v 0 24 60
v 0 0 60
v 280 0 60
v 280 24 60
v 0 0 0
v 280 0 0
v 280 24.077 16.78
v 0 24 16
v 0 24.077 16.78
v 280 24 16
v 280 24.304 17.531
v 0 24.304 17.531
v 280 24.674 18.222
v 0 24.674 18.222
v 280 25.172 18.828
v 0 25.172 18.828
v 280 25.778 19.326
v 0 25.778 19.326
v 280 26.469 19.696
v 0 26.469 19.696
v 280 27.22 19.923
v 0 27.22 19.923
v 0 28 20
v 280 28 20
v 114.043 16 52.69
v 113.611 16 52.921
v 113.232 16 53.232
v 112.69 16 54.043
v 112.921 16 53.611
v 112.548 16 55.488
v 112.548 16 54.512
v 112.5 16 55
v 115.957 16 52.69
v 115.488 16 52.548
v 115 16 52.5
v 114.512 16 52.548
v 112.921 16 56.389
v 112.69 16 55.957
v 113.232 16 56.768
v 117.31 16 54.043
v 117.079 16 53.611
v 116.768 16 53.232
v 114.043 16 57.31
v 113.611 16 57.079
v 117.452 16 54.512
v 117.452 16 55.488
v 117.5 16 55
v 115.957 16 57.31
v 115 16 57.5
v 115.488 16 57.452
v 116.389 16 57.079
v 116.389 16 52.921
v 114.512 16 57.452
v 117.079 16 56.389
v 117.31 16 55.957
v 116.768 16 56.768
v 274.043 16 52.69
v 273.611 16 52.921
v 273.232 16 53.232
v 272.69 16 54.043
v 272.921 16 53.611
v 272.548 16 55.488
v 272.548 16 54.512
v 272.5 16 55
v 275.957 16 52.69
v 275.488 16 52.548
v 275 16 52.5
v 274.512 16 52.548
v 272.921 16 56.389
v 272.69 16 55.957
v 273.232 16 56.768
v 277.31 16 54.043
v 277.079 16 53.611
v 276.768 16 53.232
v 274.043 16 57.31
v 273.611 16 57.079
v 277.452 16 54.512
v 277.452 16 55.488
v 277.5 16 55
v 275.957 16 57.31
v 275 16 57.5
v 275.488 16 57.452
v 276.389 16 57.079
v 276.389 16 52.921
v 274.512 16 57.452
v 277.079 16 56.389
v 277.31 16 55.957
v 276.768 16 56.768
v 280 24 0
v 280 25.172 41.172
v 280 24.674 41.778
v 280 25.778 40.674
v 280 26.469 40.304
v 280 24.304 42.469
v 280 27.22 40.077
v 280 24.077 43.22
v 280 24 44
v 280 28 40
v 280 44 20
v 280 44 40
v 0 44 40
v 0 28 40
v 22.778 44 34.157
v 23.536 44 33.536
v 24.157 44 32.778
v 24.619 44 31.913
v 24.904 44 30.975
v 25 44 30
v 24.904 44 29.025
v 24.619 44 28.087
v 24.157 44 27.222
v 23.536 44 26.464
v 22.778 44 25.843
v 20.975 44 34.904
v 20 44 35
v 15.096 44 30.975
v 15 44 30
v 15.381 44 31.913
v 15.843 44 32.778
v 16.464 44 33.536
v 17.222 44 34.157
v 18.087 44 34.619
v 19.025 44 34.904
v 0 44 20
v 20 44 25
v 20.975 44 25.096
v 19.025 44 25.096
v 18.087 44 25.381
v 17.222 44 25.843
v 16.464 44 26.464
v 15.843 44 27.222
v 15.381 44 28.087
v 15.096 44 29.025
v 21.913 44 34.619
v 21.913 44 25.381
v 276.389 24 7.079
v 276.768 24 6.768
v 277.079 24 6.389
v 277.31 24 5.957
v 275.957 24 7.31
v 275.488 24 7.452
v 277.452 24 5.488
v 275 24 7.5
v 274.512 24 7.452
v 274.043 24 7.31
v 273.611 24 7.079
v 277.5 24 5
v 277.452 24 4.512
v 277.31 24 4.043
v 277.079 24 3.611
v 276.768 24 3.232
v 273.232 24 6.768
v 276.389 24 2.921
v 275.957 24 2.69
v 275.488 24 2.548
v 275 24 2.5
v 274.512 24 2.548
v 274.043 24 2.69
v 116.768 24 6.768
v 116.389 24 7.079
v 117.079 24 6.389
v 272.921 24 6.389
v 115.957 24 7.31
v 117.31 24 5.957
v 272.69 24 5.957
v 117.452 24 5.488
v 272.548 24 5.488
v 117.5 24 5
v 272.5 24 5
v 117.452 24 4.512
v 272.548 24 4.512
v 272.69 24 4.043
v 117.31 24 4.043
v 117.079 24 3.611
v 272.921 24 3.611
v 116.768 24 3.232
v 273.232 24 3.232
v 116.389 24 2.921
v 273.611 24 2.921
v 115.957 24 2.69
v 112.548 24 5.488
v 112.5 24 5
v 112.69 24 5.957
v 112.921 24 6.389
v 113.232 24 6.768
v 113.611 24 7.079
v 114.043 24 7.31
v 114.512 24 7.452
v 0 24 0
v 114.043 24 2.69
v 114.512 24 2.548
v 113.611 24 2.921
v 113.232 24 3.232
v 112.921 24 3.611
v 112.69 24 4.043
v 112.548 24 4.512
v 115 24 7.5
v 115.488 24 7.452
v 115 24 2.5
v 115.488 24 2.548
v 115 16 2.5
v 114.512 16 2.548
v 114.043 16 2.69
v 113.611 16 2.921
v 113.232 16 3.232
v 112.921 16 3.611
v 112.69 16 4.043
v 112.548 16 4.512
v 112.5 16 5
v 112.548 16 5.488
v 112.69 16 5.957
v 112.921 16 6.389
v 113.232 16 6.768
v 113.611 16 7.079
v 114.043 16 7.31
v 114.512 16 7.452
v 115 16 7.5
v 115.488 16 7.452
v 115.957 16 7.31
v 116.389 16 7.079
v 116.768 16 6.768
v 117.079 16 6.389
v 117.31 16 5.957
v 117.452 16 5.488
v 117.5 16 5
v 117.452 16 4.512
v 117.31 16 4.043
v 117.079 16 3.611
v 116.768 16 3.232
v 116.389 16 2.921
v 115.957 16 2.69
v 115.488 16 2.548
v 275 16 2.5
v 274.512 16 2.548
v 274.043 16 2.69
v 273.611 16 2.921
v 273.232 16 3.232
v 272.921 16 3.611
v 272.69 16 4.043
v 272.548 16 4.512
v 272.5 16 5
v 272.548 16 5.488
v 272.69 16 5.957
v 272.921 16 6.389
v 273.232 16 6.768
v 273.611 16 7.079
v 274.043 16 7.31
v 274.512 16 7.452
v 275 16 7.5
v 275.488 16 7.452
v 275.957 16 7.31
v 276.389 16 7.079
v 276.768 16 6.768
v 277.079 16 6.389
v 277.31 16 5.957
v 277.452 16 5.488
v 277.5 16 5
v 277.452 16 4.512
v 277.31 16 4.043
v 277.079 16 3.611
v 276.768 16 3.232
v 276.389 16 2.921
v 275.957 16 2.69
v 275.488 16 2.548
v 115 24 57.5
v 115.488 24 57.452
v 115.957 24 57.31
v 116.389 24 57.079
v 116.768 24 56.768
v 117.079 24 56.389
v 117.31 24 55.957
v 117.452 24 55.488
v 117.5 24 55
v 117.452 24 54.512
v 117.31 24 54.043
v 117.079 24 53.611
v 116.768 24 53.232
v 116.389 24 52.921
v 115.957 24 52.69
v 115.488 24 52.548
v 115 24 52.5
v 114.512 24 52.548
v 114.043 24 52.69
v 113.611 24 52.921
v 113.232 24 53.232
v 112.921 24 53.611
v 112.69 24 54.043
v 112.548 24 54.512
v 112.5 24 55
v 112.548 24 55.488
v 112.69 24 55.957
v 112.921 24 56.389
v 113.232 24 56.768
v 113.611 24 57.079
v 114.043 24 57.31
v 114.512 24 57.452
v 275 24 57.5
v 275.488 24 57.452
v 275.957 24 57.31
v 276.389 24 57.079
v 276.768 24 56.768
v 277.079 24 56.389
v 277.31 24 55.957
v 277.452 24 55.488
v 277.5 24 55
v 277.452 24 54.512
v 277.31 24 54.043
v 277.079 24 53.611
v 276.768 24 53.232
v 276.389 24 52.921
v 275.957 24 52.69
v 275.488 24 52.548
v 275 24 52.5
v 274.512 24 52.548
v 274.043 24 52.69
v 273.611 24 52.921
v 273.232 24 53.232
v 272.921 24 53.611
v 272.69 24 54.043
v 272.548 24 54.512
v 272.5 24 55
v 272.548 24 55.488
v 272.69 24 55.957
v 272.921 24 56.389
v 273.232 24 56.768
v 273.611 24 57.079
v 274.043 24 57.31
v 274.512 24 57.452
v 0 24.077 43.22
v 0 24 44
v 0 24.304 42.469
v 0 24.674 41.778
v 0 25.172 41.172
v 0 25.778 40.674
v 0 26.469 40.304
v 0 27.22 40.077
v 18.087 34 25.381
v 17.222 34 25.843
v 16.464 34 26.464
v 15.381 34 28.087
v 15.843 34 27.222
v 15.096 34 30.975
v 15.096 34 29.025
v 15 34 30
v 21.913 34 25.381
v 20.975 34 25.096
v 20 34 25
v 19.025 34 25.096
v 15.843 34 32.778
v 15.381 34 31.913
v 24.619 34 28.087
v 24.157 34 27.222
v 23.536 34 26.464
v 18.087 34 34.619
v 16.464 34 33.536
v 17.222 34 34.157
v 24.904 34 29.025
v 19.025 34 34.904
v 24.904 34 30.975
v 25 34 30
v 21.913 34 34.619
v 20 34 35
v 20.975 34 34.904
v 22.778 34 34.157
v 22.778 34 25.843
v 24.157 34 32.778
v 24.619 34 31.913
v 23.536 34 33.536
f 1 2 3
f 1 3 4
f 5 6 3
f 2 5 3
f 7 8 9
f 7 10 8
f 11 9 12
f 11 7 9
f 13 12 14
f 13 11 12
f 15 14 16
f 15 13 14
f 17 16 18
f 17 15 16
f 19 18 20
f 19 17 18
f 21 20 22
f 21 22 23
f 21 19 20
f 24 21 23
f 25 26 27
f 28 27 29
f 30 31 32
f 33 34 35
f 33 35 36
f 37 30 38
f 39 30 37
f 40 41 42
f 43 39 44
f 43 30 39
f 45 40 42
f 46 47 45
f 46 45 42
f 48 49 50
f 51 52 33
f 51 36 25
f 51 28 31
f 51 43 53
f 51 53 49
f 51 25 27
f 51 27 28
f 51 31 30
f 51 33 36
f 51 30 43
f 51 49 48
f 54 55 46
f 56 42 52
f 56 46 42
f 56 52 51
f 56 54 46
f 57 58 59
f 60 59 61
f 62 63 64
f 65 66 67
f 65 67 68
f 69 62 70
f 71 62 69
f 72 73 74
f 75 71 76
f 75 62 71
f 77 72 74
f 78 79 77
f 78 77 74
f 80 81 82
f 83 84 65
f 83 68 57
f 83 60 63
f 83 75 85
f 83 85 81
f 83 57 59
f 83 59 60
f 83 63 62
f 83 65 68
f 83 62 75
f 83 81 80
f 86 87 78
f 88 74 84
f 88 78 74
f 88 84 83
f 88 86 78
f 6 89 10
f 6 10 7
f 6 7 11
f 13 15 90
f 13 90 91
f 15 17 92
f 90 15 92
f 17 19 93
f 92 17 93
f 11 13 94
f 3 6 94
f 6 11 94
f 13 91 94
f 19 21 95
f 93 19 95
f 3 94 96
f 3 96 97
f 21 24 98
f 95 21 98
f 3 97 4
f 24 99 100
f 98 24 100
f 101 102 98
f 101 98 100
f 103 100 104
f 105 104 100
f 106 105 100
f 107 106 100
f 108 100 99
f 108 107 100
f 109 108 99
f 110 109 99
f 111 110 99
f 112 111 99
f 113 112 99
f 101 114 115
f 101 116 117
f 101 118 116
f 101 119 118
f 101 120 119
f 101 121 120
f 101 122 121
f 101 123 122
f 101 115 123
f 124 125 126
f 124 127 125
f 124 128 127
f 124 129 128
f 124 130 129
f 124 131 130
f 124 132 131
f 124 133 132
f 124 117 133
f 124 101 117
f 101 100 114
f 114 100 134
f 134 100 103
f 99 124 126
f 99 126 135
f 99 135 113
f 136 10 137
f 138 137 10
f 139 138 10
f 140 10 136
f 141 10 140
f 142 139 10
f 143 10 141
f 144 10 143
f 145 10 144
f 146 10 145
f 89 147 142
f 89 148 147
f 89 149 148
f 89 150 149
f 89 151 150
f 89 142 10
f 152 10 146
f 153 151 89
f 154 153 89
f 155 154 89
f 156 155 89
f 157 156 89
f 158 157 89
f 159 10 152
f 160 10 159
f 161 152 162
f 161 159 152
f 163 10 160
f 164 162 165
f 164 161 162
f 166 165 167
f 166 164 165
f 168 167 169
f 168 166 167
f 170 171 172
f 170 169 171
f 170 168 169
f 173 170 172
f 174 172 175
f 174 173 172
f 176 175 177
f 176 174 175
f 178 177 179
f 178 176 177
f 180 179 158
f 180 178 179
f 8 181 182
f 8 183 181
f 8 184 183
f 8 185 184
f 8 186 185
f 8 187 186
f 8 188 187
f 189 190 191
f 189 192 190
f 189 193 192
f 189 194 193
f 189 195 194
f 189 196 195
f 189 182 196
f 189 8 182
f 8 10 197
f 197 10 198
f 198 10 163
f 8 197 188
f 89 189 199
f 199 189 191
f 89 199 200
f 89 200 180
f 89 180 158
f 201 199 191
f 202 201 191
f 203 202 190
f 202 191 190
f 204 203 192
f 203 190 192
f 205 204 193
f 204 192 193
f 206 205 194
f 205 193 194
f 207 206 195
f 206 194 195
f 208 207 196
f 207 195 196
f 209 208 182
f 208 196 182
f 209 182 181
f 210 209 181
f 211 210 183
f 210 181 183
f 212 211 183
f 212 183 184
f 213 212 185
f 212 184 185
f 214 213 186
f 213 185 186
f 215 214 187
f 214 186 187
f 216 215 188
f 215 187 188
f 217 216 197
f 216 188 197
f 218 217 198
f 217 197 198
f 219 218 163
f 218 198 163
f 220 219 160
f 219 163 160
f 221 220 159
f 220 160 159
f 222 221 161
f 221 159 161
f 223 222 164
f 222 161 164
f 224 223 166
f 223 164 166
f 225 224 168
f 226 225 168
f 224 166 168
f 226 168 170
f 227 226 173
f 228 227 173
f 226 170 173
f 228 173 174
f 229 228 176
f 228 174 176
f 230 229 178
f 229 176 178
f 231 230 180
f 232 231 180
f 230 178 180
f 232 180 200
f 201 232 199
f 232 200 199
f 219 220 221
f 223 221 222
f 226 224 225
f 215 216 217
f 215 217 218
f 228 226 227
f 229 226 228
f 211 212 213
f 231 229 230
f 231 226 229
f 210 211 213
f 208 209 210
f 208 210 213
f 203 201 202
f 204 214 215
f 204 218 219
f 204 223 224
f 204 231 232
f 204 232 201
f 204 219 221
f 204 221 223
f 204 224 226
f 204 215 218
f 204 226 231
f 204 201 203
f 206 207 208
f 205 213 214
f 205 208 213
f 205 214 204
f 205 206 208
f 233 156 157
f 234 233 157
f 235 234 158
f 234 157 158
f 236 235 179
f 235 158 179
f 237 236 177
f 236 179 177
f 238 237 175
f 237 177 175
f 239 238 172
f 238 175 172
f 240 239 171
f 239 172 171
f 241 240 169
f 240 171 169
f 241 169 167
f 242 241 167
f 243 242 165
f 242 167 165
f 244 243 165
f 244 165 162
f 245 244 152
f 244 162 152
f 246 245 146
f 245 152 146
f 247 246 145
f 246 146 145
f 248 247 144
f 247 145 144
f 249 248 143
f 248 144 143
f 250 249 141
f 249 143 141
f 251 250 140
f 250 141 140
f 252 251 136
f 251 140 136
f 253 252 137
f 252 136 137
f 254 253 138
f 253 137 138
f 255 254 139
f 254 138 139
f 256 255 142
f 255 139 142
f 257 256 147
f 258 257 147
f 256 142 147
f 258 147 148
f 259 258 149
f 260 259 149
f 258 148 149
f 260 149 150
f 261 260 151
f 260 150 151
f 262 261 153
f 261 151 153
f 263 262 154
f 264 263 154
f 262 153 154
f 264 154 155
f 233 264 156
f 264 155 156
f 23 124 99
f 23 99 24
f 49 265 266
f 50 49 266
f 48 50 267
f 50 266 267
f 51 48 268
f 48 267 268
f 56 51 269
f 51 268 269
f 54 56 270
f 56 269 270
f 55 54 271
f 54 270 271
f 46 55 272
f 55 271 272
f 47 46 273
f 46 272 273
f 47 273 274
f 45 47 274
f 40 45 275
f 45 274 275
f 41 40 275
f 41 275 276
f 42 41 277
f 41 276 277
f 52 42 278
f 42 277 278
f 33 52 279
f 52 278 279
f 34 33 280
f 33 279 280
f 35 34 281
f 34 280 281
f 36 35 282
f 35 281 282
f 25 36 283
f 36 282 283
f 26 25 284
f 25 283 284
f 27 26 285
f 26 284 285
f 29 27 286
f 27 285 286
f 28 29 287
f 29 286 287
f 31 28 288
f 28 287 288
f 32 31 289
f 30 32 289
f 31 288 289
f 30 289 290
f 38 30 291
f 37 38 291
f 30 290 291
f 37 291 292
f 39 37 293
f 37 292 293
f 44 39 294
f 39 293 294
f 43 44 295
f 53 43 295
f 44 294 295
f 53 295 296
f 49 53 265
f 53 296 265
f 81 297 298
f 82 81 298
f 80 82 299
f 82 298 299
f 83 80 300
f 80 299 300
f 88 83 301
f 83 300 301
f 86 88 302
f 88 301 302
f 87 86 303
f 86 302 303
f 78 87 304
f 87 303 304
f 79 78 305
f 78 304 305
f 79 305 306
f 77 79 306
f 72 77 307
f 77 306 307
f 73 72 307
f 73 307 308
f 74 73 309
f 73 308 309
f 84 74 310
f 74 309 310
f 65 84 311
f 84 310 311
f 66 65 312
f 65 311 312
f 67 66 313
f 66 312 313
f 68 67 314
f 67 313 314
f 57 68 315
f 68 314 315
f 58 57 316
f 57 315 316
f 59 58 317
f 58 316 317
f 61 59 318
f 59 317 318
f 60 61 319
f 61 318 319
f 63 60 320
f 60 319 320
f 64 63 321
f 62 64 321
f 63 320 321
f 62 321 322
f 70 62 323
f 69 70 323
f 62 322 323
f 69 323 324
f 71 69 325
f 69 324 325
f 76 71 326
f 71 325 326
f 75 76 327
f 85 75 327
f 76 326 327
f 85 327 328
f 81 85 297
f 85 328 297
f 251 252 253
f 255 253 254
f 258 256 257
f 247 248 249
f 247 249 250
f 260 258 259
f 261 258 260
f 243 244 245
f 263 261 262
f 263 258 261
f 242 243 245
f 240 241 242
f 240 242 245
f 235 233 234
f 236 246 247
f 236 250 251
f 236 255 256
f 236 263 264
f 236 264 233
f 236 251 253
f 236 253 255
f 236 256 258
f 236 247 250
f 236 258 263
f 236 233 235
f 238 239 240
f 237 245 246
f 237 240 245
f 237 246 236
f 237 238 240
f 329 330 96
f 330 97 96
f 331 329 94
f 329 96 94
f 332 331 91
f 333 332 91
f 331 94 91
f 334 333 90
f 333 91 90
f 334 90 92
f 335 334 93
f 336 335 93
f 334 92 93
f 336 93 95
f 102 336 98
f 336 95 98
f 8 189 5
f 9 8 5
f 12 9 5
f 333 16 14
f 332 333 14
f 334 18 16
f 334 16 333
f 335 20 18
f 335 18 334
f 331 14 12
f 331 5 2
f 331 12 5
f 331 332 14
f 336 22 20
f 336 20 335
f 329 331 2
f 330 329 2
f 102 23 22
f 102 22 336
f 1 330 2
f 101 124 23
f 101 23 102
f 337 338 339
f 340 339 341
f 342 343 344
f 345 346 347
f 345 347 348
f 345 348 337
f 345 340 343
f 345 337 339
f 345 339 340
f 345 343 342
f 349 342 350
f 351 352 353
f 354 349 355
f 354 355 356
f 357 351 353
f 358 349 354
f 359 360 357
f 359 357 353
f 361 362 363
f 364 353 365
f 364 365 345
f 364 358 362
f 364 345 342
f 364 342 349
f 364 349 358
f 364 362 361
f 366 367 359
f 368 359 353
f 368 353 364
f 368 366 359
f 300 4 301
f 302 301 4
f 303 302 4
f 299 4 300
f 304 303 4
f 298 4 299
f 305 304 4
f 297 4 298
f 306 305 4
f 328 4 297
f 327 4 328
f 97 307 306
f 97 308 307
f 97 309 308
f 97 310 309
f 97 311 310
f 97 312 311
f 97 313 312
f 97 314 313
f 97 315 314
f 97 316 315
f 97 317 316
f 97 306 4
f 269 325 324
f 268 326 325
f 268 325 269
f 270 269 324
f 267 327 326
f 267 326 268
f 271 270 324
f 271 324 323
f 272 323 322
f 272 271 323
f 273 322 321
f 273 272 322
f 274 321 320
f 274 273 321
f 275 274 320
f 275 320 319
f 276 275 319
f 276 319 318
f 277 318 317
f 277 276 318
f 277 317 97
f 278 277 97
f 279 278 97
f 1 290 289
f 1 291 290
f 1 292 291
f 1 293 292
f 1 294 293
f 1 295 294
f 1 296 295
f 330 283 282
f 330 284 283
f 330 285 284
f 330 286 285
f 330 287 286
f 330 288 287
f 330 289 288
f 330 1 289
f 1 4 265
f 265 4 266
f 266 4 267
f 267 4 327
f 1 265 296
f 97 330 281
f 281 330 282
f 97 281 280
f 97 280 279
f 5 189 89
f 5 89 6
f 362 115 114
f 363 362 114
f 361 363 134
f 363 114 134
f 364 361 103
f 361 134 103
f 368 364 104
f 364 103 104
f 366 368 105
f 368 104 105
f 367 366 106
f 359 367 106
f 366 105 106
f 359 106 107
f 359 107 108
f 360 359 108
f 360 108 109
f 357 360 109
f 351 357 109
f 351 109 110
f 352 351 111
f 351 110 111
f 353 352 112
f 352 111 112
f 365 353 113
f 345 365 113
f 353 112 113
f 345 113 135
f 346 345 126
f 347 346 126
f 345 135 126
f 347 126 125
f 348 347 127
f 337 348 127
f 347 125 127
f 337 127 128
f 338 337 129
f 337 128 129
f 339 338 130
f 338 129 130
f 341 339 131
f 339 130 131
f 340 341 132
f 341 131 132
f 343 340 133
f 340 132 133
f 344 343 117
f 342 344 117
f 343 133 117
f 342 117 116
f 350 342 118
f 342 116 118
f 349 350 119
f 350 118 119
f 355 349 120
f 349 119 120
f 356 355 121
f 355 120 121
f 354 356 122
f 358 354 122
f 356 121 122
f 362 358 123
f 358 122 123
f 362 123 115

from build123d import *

# Parameters (mm, degrees)
BOSS_EXTRUDE1_DEPTH = 280
SKETCH3_R           = 2.5
CUT_EXTRUDE2_DEPTH  = 8
FILLET1_R           = 4
SKETCH4_R           = 5
CUT_EXTRUDE3_DEPTH  = 10


with BuildPart() as part:
    # Sketch1 → Boss-Extrude1 (new body)
    with BuildSketch(Plane(origin=(0, 0, 0), x_dir=(0, 0, -1), z_dir=(1, 0, 0))):
        Polygon((0, 0), (-60, 0), (-60, 24), (-40, 24), (-40, 44), (-20, 44), (-20, 24), (0, 24), align=None)
    extrude(amount=BOSS_EXTRUDE1_DEPTH)

    # Sketch3 → Cut-Extrude2 (cut)
    with BuildSketch(Plane(origin=(0, 24, 0), x_dir=(1, 0, 0), z_dir=(0, 1, 0))):
        with Locations(Location((115, -55, 0), (0, 0, 270))):
            Circle(SKETCH3_R)
        with Locations(Location((275, -55, 0), (0, 0, 270))):
            Circle(SKETCH3_R)
        with Locations(Location((275, -5, 0), (0, 0, 90))):
            Circle(SKETCH3_R)
        with Locations(Location((115, -5, 0), (0, 0, 90))):
            Circle(SKETCH3_R)
    extrude(amount=-CUT_EXTRUDE2_DEPTH, mode=Mode.SUBTRACT)

    # Fillet1
    fillet1_edges = [part.edges().sort_by_distance(p)[0] for p in [
        (140, 24, 40),
        (140, 24, 20),
    ]]
    fillet(fillet1_edges, radius=FILLET1_R)

    # Sketch4 → Cut-Extrude3 (cut)
    with BuildSketch(Plane(origin=(0, 44, 0), x_dir=(1, 0, 0), z_dir=(0, 1, 0))):
        with Locations(Location((20, -30, 0), (0, 0, 270))):
            Circle(SKETCH4_R)
    extrude(amount=-CUT_EXTRUDE3_DEPTH, mode=Mode.SUBTRACT)


solid = part.part
